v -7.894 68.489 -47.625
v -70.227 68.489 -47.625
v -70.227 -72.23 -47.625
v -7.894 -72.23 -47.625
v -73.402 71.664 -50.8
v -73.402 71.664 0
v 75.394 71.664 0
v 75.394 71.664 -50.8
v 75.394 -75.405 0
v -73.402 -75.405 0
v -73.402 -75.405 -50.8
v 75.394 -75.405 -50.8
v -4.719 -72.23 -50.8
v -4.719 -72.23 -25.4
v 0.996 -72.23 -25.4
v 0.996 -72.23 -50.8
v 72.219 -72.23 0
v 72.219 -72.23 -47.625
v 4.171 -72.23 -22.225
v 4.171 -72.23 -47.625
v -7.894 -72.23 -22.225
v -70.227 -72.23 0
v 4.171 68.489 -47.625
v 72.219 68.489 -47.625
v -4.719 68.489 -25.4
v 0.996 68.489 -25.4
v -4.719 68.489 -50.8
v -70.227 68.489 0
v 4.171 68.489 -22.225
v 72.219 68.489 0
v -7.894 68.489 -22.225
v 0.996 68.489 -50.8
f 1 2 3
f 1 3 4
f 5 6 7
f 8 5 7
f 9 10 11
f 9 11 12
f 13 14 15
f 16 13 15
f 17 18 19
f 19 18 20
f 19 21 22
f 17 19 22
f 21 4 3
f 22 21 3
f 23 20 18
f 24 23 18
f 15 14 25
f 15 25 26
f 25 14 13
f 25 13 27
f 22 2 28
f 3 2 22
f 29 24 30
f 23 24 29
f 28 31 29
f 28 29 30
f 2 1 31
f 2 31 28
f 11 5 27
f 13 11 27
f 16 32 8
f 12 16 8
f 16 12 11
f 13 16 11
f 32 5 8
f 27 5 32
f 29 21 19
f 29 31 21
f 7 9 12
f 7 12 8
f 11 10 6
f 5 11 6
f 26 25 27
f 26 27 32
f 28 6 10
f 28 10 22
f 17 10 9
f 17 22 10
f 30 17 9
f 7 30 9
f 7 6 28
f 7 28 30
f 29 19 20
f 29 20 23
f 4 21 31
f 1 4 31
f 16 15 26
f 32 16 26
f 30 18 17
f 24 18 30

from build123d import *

# Parameters (mm, degrees)
F0_W     = 148.7955749035
F0_H     = 147.0687389374
F1_DEPTH = 50.8
F3_START = -25.4
F2_W     = 5.715
F2_H     = 140.7187389374
F3_DEPTH = 38.1
F4_T     = -3.175


# Not quite as in the source:
# - a shell that OpenCascade refuses in one call is made with other operations: the cavity is built on its own and cut out


with BuildPart() as f1:
    # F0 (on Top) → F1 (new body)
    with BuildSketch(Plane.XY):
        with Locations((0.9957179427, -1.8707364798)):
            Rectangle(F0_W, F0_H)
    extrude(amount=-F1_DEPTH)

    # F2 (on face) → F3 (cut)
    with BuildSketch(Plane.XY.offset(F3_START)):
        with Locations((-1.8617820573, -1.8707364798)):
            Rectangle(F2_W, F2_H)
    extrude(amount=-F3_DEPTH, mode=Mode.SUBTRACT)

    # F4: a shell. OpenCascade refuses it in one call, so the cavity is built on its own and cut out:
    # the body offset inwards by the wall thickness, plus a prism from it out through each open face.
    f4_core = offset(f1.part, amount=F4_T, kind=Kind.INTERSECTION, mode=Mode.PRIVATE)
    f4_exits = [f4_core.faces().sort_by_distance(p)[0] for p in [
        (0.995718, -1.870736, -3.175),
    ]]
    add(f4_core, mode=Mode.SUBTRACT)
    extrude(f4_exits, amount=-F4_T, mode=Mode.SUBTRACT)


solid = f1.part
